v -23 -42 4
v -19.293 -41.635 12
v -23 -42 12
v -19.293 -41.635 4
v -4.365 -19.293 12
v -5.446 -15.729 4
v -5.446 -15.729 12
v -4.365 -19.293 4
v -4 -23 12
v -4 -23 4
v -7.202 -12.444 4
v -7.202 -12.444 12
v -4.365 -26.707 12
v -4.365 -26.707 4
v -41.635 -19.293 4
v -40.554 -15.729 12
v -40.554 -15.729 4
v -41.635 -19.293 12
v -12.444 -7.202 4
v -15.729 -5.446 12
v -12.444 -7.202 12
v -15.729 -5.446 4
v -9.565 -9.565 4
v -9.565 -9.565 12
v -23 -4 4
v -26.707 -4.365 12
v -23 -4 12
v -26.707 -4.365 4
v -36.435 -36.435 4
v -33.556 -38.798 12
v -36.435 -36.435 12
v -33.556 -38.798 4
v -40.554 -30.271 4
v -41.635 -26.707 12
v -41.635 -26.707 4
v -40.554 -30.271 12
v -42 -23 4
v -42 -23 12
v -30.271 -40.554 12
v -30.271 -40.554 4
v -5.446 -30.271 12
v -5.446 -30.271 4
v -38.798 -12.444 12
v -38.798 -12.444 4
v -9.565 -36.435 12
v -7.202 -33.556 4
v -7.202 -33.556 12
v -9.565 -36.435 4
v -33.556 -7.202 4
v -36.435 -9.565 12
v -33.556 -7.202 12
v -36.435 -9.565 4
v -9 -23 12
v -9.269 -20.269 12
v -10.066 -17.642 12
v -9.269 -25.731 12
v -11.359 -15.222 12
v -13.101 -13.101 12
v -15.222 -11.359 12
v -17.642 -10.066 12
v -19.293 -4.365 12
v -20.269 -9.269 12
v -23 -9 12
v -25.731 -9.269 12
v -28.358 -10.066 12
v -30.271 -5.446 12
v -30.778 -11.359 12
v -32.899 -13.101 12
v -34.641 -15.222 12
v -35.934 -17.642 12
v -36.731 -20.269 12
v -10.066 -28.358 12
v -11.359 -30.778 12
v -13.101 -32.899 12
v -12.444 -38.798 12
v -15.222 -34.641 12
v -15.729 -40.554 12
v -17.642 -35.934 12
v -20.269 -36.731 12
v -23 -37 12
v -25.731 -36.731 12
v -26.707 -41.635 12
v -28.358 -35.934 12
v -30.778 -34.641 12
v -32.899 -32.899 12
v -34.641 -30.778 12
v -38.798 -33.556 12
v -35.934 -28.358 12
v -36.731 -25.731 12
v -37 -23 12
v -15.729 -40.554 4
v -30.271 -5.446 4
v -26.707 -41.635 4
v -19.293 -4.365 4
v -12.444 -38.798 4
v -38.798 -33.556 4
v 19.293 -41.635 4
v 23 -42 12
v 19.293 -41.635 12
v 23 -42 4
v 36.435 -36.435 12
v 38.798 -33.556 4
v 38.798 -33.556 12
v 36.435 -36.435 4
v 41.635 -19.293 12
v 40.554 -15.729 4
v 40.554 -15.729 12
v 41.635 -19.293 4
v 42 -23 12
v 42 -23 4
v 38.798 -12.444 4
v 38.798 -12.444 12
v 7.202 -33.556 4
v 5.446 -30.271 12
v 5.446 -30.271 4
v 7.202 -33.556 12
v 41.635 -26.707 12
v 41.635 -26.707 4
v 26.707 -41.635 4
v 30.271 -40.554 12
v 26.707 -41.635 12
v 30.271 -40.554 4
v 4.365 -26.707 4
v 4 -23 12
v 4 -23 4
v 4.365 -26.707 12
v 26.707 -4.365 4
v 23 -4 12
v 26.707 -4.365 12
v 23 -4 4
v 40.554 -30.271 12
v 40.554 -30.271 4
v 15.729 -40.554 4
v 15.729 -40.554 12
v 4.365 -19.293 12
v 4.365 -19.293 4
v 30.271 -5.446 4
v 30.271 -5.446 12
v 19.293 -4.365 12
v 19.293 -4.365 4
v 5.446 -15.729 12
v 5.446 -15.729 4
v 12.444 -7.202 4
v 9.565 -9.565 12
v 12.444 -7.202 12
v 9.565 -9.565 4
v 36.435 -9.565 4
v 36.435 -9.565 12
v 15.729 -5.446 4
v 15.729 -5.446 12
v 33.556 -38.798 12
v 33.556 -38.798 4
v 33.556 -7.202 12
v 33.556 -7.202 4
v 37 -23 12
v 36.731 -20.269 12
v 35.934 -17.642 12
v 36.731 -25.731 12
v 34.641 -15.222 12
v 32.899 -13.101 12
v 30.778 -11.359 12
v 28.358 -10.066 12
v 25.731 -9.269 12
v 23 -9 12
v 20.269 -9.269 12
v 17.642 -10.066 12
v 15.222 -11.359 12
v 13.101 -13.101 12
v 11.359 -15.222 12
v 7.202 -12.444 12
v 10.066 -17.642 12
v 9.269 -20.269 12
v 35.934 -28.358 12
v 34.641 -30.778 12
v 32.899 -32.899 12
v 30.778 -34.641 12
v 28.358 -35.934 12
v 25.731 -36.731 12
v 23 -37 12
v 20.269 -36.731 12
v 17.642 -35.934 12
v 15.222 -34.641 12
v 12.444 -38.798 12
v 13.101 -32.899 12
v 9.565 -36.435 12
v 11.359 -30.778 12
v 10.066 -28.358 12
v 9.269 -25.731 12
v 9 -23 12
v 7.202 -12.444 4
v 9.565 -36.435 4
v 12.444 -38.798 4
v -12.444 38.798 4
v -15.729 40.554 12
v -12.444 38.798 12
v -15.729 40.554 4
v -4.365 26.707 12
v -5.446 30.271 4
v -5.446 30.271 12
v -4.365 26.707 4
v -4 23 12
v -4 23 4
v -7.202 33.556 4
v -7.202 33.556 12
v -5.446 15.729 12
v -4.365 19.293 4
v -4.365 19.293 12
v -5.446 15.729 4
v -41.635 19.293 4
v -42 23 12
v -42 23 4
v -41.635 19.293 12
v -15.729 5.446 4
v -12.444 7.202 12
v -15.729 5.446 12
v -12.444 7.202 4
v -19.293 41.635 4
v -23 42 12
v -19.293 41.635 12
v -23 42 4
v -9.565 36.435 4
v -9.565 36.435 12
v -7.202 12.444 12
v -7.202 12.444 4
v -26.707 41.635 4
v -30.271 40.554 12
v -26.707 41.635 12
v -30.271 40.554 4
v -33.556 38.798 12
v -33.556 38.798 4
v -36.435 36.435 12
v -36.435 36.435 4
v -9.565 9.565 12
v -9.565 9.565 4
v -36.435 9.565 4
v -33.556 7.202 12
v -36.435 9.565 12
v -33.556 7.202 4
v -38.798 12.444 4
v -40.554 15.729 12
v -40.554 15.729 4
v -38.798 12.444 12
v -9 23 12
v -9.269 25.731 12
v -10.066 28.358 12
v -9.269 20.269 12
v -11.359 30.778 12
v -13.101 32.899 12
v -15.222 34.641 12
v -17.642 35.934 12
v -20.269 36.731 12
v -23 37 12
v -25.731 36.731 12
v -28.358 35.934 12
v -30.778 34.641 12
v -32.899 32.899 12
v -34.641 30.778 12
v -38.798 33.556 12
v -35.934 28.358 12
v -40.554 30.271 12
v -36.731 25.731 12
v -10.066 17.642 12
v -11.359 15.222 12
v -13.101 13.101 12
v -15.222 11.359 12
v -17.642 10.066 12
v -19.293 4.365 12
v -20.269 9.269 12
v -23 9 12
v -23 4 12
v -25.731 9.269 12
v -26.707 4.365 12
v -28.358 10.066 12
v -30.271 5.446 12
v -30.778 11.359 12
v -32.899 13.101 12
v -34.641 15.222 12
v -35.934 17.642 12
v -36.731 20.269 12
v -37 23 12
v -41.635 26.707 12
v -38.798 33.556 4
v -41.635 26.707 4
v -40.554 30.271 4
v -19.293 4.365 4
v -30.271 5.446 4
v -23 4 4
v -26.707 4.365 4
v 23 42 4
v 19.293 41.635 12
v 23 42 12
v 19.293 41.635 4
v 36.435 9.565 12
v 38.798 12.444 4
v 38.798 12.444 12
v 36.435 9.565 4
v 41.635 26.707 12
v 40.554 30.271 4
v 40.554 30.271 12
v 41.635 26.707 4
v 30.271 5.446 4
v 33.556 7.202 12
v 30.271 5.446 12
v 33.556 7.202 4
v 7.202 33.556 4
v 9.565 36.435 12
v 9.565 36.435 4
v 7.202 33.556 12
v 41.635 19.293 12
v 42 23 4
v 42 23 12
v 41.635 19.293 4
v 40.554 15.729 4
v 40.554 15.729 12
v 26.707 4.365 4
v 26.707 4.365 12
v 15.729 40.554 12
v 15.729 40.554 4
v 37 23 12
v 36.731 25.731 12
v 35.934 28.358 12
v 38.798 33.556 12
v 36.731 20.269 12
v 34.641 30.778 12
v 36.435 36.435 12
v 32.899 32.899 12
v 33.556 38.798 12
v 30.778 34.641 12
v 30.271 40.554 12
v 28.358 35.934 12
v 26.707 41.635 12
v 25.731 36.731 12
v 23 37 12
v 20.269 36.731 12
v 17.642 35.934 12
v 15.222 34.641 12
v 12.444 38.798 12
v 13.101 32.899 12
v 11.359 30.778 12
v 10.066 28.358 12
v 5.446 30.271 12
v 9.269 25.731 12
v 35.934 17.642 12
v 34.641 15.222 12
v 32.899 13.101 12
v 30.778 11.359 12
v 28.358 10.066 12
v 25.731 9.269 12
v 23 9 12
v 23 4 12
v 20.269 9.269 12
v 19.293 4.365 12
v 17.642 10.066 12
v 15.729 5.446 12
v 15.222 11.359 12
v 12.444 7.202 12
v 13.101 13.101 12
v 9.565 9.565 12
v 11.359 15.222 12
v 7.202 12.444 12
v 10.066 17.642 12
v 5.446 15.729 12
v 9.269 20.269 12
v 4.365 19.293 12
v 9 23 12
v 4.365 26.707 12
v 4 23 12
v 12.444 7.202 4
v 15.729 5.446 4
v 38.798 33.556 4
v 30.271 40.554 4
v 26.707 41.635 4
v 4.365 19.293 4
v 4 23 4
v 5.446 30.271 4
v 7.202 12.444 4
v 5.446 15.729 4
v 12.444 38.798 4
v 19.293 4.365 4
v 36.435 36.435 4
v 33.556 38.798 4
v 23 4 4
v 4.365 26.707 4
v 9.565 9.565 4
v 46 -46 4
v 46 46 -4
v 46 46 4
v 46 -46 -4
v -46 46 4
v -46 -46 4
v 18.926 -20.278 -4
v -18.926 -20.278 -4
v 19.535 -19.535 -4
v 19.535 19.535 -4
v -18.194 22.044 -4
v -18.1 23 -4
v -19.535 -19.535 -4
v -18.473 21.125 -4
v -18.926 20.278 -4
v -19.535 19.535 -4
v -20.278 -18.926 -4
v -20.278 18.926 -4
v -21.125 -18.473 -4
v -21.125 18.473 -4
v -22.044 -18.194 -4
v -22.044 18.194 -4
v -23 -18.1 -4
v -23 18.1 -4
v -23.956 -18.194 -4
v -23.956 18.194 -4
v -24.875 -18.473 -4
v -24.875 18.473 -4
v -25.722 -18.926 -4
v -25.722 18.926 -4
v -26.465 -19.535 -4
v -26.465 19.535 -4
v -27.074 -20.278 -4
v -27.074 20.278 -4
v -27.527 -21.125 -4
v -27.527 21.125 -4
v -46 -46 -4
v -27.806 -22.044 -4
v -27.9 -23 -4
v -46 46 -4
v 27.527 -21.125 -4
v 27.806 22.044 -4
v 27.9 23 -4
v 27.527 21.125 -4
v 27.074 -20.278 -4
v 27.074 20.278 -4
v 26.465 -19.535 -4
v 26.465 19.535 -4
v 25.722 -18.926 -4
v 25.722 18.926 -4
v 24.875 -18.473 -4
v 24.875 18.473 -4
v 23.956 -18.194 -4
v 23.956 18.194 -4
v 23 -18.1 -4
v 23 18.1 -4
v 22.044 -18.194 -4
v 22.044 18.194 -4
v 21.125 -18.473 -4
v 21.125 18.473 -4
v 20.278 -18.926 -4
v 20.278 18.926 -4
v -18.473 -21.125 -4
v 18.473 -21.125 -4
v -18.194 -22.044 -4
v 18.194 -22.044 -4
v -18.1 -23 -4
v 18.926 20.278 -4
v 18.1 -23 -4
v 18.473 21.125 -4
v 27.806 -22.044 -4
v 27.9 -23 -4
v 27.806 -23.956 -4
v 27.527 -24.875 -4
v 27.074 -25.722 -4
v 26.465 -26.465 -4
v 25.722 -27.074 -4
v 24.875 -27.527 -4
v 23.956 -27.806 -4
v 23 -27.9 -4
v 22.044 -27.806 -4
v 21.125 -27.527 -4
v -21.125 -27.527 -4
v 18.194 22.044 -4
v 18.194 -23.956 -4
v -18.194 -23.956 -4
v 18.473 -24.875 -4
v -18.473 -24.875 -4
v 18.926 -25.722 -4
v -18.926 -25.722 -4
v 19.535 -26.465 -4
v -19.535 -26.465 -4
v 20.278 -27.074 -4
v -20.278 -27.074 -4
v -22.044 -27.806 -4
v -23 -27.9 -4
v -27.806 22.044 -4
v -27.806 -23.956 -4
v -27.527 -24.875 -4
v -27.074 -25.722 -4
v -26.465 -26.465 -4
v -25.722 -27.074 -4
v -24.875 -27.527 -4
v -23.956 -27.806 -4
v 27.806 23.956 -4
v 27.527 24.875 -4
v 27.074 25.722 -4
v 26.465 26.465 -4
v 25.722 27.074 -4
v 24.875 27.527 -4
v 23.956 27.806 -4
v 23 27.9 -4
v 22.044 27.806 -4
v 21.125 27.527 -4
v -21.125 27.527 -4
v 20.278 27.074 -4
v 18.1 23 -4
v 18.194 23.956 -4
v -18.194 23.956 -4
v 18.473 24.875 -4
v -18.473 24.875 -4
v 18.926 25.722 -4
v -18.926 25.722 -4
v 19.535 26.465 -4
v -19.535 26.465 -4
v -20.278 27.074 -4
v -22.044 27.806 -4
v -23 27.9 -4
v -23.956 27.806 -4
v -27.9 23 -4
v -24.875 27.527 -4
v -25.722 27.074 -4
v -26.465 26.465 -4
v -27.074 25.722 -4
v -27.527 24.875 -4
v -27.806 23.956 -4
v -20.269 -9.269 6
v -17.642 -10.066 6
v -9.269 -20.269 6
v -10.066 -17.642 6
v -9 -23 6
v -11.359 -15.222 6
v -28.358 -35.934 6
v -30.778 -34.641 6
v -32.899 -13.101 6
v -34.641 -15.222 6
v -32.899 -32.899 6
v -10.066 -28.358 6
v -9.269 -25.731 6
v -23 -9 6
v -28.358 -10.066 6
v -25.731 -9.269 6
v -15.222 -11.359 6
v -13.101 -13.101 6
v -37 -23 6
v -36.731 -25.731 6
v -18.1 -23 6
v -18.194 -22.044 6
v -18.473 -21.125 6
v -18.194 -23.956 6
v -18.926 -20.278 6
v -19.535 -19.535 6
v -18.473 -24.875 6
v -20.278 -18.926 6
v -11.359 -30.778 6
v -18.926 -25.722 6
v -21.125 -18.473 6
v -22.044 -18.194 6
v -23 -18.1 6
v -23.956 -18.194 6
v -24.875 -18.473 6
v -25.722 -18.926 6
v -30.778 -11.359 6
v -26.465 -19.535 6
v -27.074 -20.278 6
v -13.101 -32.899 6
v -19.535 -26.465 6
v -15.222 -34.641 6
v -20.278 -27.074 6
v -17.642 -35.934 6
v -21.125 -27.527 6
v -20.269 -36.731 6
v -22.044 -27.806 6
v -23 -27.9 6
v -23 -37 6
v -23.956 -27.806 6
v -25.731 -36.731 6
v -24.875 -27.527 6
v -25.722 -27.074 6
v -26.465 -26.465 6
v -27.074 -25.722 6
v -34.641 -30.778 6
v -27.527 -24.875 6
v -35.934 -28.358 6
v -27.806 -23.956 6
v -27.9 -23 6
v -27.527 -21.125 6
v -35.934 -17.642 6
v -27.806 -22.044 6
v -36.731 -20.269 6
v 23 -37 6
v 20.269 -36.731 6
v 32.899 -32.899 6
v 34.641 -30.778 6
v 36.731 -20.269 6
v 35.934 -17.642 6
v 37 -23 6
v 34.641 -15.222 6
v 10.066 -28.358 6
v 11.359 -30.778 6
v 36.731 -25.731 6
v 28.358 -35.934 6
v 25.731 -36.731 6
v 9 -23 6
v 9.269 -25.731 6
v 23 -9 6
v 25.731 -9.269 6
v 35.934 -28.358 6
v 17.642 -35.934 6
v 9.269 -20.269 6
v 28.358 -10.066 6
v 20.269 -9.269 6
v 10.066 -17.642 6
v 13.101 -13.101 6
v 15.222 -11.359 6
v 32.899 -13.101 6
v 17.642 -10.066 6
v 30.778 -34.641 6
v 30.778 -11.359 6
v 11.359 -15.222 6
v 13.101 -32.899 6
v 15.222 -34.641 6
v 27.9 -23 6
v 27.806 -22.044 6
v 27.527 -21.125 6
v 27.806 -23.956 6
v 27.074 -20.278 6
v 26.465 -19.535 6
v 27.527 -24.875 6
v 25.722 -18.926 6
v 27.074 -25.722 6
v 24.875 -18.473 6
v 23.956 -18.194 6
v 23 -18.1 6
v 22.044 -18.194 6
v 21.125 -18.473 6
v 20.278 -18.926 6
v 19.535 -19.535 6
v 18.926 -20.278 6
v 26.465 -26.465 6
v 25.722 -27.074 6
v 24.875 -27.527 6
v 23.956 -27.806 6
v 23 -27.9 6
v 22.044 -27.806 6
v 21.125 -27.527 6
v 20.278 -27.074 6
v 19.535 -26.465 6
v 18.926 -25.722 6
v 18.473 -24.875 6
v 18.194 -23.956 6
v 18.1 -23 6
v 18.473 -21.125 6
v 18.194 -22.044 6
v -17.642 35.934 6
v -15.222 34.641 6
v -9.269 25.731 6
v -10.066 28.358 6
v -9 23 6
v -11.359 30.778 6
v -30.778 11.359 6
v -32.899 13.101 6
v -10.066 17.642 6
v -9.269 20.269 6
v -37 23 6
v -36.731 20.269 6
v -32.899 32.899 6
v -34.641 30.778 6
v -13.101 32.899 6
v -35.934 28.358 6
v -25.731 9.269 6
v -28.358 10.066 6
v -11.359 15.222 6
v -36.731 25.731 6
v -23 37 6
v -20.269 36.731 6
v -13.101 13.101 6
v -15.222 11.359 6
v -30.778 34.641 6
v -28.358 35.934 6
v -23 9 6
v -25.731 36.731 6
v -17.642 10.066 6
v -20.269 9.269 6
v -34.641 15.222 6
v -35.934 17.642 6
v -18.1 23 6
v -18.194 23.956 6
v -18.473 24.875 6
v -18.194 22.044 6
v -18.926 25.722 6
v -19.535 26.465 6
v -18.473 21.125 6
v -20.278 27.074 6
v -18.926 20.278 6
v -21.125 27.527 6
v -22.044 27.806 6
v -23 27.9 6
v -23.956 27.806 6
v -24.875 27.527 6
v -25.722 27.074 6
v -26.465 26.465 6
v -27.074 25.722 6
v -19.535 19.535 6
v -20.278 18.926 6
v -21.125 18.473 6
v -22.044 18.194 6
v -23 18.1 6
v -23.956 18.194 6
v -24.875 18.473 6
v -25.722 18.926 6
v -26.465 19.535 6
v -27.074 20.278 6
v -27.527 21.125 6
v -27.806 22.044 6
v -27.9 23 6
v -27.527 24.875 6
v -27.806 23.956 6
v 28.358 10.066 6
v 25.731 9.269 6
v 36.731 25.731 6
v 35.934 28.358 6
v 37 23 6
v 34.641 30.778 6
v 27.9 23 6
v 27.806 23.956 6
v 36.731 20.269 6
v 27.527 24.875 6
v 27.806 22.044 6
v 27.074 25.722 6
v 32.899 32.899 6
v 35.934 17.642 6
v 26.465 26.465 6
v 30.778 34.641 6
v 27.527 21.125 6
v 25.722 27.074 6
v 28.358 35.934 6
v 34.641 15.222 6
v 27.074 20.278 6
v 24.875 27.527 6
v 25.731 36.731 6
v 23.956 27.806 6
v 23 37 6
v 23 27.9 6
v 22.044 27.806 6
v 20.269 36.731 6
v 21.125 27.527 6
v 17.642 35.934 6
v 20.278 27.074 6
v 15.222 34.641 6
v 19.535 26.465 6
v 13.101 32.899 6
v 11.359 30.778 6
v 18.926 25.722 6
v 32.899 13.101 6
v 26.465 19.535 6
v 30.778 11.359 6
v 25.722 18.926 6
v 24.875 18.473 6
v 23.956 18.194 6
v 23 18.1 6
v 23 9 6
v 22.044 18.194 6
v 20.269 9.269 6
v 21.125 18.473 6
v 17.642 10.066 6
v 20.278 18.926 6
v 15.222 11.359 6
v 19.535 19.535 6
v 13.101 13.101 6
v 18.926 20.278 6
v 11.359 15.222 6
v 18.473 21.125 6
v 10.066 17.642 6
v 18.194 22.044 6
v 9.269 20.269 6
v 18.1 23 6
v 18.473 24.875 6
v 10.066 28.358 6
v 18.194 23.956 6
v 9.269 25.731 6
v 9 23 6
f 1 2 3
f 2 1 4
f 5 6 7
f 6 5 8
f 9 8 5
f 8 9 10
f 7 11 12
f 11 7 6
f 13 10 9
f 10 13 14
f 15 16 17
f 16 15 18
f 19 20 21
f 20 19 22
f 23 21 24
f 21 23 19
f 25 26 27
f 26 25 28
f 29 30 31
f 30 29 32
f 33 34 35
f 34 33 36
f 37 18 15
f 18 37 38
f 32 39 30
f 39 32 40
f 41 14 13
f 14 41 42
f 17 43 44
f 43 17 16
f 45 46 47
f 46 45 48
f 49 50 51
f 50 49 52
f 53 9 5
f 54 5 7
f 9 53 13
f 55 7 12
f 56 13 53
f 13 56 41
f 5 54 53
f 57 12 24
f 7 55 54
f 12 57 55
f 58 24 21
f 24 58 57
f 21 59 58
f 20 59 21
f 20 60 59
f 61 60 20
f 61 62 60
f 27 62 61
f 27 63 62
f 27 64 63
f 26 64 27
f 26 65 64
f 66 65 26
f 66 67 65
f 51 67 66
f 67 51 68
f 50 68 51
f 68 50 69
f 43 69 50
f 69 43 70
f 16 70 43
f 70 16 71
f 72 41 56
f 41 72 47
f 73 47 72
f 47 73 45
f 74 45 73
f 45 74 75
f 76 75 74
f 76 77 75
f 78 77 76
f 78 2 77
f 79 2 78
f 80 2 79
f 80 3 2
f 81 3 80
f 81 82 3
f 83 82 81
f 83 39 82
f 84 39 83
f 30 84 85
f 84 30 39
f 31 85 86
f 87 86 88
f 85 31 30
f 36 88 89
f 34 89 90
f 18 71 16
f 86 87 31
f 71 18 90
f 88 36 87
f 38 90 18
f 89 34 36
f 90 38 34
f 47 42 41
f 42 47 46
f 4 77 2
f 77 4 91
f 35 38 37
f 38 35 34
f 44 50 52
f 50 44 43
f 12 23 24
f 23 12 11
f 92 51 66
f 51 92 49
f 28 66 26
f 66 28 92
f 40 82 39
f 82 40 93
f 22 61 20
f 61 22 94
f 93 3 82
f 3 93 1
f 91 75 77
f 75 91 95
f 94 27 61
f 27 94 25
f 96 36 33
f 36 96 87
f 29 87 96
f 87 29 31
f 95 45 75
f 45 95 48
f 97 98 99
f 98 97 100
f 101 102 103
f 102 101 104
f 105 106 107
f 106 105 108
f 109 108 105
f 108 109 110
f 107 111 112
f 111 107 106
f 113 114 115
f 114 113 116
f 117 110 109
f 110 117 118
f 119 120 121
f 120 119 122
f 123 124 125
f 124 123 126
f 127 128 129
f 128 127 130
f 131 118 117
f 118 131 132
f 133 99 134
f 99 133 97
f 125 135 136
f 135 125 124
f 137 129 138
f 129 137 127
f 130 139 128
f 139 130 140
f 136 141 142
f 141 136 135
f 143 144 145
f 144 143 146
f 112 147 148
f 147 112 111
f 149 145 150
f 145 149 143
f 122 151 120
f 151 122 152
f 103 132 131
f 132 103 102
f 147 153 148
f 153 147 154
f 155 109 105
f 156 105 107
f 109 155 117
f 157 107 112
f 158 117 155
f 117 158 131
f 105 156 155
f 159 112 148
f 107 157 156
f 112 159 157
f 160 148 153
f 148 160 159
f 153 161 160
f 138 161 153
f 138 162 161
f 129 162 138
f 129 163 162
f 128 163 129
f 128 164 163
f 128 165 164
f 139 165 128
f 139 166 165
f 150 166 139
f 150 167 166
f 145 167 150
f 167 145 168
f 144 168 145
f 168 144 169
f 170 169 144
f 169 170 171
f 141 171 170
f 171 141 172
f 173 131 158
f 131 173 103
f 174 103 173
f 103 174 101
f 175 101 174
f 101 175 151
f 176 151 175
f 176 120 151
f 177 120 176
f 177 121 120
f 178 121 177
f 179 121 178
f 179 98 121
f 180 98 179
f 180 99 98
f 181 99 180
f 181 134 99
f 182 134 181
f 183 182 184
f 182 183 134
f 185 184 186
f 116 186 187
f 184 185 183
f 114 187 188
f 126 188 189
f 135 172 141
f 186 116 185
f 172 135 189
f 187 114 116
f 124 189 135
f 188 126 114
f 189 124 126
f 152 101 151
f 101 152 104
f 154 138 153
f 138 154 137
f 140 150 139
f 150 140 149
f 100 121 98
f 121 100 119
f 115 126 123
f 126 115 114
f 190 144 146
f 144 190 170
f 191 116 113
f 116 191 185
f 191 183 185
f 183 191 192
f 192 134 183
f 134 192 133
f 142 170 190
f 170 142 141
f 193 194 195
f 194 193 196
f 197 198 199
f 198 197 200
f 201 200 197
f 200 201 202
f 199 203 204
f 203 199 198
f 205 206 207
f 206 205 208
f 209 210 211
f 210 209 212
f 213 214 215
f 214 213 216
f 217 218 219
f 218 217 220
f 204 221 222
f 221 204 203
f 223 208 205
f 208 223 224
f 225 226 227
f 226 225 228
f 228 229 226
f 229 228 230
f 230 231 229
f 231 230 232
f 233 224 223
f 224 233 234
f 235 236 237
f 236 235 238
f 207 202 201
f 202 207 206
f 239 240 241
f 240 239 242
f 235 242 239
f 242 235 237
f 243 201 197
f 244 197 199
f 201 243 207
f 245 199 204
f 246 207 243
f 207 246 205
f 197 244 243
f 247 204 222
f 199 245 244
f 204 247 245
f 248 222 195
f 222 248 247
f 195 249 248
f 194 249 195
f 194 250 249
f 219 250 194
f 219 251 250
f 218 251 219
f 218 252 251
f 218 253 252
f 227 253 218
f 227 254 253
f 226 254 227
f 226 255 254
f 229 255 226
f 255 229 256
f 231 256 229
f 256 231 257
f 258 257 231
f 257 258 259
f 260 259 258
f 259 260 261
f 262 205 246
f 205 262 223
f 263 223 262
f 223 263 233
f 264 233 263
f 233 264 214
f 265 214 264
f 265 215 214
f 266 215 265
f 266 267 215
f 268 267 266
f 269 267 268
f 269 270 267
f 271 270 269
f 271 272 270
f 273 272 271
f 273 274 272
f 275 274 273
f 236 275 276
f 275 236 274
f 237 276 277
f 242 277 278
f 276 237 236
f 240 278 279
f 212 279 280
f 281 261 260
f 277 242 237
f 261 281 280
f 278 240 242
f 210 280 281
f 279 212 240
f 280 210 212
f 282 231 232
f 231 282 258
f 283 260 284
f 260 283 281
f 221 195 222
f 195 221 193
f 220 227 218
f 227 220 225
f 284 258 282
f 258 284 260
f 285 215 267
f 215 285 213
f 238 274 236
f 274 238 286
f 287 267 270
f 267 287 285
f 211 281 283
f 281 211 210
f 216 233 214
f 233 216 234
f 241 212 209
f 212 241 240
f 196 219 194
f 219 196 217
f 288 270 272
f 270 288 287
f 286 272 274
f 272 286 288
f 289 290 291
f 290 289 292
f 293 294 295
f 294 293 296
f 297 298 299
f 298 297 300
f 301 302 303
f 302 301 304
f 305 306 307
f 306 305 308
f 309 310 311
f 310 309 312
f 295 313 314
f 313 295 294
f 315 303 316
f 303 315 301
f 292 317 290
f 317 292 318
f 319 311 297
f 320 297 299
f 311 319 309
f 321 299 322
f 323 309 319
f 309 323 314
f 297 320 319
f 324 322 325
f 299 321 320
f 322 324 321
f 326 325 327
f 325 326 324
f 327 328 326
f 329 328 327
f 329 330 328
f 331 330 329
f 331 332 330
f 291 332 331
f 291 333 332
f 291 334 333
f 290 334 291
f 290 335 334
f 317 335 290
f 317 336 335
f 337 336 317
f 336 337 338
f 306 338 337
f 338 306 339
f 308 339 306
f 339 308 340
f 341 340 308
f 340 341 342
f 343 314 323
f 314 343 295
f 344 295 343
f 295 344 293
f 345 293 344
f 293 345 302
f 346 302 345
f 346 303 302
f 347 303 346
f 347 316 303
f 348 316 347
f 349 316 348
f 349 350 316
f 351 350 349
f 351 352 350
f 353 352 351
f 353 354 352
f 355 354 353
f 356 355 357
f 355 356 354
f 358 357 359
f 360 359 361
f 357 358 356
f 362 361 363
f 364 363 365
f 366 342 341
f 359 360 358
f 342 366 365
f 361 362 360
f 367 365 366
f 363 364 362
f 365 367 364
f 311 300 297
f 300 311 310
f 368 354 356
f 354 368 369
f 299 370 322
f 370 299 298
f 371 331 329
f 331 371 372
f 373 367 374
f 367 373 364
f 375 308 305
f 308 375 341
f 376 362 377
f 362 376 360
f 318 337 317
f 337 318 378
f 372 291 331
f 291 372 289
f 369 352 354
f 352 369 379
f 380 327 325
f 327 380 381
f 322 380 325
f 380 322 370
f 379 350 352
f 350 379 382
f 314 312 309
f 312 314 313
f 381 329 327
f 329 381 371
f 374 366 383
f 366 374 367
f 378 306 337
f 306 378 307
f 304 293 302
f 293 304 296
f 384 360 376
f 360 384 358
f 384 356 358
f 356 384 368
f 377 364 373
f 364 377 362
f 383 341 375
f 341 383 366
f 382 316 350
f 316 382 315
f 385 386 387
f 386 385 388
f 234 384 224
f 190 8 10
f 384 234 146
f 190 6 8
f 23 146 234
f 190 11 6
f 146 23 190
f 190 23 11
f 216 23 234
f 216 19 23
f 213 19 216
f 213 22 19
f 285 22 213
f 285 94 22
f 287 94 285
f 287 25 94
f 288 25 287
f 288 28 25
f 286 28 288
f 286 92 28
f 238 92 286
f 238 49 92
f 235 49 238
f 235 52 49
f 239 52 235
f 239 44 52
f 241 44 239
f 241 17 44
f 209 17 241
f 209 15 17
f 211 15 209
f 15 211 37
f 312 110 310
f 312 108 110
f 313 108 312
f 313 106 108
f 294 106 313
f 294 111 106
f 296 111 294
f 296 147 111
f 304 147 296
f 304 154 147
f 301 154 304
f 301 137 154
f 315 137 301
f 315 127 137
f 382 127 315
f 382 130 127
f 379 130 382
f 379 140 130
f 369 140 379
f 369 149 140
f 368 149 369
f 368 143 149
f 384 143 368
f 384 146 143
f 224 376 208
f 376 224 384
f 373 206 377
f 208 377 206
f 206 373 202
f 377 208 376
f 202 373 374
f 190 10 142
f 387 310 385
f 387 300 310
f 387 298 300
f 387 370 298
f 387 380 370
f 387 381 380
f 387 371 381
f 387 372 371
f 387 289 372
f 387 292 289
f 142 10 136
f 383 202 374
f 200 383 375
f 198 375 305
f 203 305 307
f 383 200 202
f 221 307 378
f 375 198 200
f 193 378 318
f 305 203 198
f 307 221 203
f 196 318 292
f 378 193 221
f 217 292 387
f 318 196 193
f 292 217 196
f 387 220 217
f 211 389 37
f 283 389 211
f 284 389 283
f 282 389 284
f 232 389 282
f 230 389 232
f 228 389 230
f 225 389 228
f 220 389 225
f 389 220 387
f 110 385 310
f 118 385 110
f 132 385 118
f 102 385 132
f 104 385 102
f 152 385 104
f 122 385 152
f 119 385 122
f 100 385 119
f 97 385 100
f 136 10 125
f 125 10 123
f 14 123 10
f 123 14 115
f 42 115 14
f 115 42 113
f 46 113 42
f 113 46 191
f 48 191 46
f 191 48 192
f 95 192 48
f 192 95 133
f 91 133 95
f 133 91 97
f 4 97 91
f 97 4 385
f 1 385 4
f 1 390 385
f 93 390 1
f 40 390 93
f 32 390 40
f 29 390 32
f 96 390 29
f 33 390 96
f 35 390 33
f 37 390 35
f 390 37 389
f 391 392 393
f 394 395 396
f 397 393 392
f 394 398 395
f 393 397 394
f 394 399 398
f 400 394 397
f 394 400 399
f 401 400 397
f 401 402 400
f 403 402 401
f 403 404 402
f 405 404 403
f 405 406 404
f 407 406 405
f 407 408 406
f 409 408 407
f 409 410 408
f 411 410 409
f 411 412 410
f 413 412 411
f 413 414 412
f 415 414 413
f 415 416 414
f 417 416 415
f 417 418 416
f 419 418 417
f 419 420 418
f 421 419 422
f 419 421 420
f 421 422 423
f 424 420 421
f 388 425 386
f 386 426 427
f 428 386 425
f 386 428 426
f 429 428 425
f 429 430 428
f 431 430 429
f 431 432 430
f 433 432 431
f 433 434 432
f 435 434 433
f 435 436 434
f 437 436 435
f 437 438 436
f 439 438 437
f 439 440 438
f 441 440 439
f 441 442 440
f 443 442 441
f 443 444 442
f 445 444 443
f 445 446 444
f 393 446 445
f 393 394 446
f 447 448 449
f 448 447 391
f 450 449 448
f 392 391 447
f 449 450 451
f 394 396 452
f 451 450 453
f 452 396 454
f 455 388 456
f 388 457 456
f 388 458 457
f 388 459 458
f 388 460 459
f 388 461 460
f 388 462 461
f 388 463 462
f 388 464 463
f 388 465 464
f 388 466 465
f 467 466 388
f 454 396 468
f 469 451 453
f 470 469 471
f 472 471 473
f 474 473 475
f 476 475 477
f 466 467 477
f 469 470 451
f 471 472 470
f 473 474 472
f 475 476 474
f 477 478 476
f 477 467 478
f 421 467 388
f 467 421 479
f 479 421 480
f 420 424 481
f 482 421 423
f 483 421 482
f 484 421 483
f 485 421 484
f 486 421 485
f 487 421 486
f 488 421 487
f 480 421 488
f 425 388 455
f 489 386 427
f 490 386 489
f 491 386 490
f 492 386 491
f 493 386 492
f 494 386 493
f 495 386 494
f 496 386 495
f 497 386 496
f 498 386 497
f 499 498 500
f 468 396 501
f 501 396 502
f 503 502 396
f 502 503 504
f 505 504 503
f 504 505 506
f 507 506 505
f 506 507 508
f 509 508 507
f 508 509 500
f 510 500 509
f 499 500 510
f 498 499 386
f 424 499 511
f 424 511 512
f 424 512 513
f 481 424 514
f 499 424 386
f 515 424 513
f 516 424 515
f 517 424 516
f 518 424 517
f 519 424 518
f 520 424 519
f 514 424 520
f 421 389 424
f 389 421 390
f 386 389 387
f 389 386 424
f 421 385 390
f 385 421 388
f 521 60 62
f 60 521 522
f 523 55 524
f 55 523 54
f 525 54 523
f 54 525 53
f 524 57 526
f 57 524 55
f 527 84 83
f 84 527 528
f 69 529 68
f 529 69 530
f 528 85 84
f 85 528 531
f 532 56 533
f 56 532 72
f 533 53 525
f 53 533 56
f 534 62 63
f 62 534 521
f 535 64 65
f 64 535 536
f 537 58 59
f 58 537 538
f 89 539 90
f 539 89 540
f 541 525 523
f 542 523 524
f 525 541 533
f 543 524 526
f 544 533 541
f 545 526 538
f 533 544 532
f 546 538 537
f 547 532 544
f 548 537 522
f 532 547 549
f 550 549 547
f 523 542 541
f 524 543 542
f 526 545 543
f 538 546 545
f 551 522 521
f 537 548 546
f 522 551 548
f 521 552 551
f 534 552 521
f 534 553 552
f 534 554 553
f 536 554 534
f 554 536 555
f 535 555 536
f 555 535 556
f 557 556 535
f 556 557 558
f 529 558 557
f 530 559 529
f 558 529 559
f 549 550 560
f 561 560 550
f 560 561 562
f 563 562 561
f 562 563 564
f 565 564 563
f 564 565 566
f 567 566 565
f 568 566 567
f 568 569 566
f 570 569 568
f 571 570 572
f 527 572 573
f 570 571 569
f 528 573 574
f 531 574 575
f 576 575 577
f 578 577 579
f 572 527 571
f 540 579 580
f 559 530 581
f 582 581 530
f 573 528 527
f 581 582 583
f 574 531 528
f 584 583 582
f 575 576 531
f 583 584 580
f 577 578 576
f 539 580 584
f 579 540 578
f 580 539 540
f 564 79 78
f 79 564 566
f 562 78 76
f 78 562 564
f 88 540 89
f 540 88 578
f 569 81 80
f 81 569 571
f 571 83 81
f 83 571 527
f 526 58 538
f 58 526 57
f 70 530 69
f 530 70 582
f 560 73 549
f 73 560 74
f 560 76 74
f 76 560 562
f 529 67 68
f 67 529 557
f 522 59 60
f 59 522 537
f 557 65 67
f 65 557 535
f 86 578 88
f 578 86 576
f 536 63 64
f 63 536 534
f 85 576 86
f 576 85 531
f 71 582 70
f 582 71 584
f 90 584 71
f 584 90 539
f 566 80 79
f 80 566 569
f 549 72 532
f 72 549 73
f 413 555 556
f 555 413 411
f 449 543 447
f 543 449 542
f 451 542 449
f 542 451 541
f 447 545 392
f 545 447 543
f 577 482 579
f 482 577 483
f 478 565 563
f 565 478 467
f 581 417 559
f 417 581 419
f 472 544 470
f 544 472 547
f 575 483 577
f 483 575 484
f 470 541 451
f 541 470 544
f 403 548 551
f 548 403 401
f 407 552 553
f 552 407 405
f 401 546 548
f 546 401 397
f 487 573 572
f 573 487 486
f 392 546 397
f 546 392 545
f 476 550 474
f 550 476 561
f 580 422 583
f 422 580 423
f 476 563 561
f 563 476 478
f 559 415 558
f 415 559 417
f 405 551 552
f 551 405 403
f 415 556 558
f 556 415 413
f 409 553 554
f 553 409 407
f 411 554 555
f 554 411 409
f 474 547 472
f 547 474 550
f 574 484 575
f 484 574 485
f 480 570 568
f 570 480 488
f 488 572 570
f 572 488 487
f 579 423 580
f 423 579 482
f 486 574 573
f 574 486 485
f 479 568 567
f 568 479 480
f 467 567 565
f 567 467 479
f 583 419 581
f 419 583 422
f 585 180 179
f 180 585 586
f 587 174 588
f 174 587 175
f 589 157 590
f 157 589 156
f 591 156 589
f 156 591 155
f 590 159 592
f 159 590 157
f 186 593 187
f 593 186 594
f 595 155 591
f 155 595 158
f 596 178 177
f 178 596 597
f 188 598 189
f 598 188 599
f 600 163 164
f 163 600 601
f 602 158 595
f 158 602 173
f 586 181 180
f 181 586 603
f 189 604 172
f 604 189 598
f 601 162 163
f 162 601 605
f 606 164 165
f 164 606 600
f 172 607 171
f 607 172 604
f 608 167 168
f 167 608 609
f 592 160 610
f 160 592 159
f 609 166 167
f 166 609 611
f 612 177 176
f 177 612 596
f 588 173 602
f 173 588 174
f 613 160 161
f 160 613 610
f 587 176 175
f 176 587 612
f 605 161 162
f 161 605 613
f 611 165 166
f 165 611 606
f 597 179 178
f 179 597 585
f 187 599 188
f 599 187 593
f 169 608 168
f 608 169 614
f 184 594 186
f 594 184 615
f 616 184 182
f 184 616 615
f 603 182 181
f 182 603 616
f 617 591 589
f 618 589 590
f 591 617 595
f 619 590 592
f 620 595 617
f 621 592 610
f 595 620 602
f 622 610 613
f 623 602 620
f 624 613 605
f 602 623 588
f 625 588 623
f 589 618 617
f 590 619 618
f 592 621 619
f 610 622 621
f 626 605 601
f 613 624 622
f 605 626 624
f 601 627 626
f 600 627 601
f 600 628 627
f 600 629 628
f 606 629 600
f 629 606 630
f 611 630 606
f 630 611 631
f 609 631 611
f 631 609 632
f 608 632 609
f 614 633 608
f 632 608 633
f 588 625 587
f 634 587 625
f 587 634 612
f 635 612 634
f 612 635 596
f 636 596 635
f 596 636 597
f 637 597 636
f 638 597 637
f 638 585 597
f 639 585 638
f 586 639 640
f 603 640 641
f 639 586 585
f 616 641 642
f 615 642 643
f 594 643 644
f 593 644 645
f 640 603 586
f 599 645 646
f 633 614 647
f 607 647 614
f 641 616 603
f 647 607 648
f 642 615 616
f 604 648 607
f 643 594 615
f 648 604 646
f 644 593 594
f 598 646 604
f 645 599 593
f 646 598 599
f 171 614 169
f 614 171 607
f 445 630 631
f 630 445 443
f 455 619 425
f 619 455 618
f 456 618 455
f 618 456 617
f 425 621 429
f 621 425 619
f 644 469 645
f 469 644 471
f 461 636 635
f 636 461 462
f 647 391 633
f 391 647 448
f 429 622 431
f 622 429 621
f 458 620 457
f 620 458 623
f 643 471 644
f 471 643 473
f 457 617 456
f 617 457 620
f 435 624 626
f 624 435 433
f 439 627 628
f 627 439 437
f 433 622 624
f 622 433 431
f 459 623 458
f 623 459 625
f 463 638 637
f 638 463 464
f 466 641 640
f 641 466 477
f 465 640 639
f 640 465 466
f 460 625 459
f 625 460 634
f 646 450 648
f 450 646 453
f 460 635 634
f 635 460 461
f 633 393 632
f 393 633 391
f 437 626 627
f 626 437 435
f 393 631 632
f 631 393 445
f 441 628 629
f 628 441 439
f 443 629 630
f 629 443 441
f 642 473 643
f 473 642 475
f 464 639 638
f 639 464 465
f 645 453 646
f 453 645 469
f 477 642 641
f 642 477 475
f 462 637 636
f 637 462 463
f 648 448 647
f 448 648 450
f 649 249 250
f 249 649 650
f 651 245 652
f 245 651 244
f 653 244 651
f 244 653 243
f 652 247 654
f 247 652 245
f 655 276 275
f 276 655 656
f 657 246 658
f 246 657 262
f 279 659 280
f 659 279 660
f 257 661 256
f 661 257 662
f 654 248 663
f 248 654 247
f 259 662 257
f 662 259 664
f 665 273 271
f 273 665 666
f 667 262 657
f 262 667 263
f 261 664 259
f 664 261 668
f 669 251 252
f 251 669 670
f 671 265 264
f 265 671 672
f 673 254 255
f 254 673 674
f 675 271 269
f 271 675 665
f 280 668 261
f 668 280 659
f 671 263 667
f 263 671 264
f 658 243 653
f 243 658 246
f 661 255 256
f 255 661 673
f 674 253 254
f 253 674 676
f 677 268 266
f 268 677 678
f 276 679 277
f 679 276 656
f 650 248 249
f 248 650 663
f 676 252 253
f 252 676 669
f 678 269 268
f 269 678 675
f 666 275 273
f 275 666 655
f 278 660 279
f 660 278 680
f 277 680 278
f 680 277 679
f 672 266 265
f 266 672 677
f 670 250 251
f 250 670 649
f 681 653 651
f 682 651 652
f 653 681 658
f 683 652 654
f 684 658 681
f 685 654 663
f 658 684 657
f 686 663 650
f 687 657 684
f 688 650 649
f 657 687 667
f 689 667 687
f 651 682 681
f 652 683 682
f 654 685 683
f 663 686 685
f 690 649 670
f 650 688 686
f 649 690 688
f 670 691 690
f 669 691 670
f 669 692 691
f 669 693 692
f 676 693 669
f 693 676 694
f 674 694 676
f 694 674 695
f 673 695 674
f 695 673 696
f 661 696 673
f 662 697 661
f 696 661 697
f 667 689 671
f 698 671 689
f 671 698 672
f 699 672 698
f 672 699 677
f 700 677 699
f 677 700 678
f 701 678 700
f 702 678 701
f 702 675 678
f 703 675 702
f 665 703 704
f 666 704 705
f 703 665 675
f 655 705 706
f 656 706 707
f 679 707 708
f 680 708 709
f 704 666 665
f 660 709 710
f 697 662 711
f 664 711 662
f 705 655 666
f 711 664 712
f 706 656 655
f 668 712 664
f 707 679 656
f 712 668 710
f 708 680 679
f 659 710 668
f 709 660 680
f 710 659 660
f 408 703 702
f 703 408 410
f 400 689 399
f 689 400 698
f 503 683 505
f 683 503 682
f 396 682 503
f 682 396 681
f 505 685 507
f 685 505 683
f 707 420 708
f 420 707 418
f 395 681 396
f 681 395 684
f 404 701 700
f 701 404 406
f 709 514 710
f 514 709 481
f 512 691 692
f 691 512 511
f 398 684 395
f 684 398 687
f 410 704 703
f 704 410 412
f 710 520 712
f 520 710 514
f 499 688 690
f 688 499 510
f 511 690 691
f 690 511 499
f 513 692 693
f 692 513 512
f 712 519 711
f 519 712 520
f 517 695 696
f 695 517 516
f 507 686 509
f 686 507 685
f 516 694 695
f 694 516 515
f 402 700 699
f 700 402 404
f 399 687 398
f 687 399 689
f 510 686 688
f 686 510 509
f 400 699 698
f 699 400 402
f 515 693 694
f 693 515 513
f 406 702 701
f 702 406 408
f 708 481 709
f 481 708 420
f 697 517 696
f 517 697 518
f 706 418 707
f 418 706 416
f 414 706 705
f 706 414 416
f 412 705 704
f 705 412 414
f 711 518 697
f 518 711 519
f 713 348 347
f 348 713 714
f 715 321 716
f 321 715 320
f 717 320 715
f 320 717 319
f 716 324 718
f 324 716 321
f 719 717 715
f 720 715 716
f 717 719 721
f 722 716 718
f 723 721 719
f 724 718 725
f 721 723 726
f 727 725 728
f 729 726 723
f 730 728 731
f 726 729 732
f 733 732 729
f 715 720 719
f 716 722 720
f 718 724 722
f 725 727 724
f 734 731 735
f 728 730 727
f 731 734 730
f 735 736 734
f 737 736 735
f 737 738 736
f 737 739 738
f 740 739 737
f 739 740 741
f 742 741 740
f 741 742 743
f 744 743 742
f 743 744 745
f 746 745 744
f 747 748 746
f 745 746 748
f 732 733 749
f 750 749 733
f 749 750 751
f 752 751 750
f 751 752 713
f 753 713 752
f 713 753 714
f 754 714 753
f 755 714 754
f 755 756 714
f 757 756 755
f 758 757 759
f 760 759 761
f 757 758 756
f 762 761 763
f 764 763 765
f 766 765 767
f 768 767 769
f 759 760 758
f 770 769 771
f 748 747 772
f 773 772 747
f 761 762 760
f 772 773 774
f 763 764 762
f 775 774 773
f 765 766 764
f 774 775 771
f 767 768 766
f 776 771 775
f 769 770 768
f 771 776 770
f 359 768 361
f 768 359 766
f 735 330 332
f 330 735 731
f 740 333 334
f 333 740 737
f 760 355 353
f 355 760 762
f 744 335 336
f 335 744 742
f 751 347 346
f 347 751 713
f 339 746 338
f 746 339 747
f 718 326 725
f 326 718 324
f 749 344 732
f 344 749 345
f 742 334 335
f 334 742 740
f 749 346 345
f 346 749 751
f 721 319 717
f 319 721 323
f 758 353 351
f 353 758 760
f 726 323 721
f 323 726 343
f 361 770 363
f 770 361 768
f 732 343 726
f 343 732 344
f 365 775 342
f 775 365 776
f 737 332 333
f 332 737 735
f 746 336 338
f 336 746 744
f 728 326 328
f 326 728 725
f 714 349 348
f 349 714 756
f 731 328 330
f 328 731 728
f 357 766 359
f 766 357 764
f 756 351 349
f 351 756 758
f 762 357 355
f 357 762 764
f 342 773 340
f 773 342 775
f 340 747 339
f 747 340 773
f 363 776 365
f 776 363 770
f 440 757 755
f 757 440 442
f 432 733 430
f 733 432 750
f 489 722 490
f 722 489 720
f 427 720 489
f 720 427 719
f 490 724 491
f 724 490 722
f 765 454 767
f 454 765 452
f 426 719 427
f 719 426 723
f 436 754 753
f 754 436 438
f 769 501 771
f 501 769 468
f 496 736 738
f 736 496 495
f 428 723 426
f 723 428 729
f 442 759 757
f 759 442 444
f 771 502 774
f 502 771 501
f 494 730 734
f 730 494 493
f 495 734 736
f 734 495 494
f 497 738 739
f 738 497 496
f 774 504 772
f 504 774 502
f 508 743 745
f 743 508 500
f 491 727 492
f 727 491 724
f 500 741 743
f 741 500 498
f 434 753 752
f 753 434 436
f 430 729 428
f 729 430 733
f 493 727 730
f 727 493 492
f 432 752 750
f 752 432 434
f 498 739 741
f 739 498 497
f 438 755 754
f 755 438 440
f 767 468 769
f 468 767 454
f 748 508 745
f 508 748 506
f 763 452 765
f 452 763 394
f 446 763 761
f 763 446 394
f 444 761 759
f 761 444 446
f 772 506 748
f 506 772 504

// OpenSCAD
$fn = 32;

// ----------------------------------------------------------------------
// Socket pad plate
// bosses with counterbored sockets for the screws
// ----------------------------------------------------------------------

// --- parameters (mm) ---
base_t = 8;        // base plate thickness
boss_h = 8;        // boss height above the base plate
boss_d = 38;       // boss diameter
socket_d = 28;     // socket diameter
socket_depth = 6;  // socket depth from the boss face
bolt_d = 9.8;      // screw clearance hole through the socket floor
rows = 2;          // boss rows
cols = 2;          // bosses per row
pitch = 46;        // boss pitch

// --- derived feature positions (mm) ---
height = base_t + boss_h;           // = 16   overall height of the part
plate = [pitch * (cols - 1) + boss_d + 8, pitch * (rows - 1) + boss_d + 8, base_t];  // = [92, 92, 8]   overall size (x, y, z)
span_x = pitch * (cols - 1);        // = 46   distance between outer bosses
span_y = pitch * (rows - 1);        // = 46   distance between boss rows
origin_x = -span_x / 2;             // = -23   X of the first boss
origin_y = -span_y / 2;             // = -23   Y of the first boss
feature_centers = [
  [origin_x + 0 * pitch, origin_y + 0 * pitch],
  [origin_x + 1 * pitch, origin_y + 0 * pitch],
  [origin_x + 0 * pitch, origin_y + 1 * pitch],
  [origin_x + 1 * pitch, origin_y + 1 * pitch]
];   // boss centres: sockets, holes and the pads themselves are placed from here

// base plate, bosses on feature_centers, socket + through hole in each
difference() {
  union() {
    cube(plate, center = true);
    for (centre = feature_centers)
      translate([centre[0], centre[1], plate[2] / 2 - 1])
        cylinder(d = boss_d, h = boss_h + 1);
  }
  for (centre = feature_centers) {
    translate([centre[0], centre[1], plate[2] / 2 + boss_h - socket_depth])
      cylinder(d = socket_d, h = socket_depth + 1);
    translate([centre[0], centre[1], -height])
      cylinder(d = bolt_d, h = 2 * height + 2);  // through the socket floor
  }
}
